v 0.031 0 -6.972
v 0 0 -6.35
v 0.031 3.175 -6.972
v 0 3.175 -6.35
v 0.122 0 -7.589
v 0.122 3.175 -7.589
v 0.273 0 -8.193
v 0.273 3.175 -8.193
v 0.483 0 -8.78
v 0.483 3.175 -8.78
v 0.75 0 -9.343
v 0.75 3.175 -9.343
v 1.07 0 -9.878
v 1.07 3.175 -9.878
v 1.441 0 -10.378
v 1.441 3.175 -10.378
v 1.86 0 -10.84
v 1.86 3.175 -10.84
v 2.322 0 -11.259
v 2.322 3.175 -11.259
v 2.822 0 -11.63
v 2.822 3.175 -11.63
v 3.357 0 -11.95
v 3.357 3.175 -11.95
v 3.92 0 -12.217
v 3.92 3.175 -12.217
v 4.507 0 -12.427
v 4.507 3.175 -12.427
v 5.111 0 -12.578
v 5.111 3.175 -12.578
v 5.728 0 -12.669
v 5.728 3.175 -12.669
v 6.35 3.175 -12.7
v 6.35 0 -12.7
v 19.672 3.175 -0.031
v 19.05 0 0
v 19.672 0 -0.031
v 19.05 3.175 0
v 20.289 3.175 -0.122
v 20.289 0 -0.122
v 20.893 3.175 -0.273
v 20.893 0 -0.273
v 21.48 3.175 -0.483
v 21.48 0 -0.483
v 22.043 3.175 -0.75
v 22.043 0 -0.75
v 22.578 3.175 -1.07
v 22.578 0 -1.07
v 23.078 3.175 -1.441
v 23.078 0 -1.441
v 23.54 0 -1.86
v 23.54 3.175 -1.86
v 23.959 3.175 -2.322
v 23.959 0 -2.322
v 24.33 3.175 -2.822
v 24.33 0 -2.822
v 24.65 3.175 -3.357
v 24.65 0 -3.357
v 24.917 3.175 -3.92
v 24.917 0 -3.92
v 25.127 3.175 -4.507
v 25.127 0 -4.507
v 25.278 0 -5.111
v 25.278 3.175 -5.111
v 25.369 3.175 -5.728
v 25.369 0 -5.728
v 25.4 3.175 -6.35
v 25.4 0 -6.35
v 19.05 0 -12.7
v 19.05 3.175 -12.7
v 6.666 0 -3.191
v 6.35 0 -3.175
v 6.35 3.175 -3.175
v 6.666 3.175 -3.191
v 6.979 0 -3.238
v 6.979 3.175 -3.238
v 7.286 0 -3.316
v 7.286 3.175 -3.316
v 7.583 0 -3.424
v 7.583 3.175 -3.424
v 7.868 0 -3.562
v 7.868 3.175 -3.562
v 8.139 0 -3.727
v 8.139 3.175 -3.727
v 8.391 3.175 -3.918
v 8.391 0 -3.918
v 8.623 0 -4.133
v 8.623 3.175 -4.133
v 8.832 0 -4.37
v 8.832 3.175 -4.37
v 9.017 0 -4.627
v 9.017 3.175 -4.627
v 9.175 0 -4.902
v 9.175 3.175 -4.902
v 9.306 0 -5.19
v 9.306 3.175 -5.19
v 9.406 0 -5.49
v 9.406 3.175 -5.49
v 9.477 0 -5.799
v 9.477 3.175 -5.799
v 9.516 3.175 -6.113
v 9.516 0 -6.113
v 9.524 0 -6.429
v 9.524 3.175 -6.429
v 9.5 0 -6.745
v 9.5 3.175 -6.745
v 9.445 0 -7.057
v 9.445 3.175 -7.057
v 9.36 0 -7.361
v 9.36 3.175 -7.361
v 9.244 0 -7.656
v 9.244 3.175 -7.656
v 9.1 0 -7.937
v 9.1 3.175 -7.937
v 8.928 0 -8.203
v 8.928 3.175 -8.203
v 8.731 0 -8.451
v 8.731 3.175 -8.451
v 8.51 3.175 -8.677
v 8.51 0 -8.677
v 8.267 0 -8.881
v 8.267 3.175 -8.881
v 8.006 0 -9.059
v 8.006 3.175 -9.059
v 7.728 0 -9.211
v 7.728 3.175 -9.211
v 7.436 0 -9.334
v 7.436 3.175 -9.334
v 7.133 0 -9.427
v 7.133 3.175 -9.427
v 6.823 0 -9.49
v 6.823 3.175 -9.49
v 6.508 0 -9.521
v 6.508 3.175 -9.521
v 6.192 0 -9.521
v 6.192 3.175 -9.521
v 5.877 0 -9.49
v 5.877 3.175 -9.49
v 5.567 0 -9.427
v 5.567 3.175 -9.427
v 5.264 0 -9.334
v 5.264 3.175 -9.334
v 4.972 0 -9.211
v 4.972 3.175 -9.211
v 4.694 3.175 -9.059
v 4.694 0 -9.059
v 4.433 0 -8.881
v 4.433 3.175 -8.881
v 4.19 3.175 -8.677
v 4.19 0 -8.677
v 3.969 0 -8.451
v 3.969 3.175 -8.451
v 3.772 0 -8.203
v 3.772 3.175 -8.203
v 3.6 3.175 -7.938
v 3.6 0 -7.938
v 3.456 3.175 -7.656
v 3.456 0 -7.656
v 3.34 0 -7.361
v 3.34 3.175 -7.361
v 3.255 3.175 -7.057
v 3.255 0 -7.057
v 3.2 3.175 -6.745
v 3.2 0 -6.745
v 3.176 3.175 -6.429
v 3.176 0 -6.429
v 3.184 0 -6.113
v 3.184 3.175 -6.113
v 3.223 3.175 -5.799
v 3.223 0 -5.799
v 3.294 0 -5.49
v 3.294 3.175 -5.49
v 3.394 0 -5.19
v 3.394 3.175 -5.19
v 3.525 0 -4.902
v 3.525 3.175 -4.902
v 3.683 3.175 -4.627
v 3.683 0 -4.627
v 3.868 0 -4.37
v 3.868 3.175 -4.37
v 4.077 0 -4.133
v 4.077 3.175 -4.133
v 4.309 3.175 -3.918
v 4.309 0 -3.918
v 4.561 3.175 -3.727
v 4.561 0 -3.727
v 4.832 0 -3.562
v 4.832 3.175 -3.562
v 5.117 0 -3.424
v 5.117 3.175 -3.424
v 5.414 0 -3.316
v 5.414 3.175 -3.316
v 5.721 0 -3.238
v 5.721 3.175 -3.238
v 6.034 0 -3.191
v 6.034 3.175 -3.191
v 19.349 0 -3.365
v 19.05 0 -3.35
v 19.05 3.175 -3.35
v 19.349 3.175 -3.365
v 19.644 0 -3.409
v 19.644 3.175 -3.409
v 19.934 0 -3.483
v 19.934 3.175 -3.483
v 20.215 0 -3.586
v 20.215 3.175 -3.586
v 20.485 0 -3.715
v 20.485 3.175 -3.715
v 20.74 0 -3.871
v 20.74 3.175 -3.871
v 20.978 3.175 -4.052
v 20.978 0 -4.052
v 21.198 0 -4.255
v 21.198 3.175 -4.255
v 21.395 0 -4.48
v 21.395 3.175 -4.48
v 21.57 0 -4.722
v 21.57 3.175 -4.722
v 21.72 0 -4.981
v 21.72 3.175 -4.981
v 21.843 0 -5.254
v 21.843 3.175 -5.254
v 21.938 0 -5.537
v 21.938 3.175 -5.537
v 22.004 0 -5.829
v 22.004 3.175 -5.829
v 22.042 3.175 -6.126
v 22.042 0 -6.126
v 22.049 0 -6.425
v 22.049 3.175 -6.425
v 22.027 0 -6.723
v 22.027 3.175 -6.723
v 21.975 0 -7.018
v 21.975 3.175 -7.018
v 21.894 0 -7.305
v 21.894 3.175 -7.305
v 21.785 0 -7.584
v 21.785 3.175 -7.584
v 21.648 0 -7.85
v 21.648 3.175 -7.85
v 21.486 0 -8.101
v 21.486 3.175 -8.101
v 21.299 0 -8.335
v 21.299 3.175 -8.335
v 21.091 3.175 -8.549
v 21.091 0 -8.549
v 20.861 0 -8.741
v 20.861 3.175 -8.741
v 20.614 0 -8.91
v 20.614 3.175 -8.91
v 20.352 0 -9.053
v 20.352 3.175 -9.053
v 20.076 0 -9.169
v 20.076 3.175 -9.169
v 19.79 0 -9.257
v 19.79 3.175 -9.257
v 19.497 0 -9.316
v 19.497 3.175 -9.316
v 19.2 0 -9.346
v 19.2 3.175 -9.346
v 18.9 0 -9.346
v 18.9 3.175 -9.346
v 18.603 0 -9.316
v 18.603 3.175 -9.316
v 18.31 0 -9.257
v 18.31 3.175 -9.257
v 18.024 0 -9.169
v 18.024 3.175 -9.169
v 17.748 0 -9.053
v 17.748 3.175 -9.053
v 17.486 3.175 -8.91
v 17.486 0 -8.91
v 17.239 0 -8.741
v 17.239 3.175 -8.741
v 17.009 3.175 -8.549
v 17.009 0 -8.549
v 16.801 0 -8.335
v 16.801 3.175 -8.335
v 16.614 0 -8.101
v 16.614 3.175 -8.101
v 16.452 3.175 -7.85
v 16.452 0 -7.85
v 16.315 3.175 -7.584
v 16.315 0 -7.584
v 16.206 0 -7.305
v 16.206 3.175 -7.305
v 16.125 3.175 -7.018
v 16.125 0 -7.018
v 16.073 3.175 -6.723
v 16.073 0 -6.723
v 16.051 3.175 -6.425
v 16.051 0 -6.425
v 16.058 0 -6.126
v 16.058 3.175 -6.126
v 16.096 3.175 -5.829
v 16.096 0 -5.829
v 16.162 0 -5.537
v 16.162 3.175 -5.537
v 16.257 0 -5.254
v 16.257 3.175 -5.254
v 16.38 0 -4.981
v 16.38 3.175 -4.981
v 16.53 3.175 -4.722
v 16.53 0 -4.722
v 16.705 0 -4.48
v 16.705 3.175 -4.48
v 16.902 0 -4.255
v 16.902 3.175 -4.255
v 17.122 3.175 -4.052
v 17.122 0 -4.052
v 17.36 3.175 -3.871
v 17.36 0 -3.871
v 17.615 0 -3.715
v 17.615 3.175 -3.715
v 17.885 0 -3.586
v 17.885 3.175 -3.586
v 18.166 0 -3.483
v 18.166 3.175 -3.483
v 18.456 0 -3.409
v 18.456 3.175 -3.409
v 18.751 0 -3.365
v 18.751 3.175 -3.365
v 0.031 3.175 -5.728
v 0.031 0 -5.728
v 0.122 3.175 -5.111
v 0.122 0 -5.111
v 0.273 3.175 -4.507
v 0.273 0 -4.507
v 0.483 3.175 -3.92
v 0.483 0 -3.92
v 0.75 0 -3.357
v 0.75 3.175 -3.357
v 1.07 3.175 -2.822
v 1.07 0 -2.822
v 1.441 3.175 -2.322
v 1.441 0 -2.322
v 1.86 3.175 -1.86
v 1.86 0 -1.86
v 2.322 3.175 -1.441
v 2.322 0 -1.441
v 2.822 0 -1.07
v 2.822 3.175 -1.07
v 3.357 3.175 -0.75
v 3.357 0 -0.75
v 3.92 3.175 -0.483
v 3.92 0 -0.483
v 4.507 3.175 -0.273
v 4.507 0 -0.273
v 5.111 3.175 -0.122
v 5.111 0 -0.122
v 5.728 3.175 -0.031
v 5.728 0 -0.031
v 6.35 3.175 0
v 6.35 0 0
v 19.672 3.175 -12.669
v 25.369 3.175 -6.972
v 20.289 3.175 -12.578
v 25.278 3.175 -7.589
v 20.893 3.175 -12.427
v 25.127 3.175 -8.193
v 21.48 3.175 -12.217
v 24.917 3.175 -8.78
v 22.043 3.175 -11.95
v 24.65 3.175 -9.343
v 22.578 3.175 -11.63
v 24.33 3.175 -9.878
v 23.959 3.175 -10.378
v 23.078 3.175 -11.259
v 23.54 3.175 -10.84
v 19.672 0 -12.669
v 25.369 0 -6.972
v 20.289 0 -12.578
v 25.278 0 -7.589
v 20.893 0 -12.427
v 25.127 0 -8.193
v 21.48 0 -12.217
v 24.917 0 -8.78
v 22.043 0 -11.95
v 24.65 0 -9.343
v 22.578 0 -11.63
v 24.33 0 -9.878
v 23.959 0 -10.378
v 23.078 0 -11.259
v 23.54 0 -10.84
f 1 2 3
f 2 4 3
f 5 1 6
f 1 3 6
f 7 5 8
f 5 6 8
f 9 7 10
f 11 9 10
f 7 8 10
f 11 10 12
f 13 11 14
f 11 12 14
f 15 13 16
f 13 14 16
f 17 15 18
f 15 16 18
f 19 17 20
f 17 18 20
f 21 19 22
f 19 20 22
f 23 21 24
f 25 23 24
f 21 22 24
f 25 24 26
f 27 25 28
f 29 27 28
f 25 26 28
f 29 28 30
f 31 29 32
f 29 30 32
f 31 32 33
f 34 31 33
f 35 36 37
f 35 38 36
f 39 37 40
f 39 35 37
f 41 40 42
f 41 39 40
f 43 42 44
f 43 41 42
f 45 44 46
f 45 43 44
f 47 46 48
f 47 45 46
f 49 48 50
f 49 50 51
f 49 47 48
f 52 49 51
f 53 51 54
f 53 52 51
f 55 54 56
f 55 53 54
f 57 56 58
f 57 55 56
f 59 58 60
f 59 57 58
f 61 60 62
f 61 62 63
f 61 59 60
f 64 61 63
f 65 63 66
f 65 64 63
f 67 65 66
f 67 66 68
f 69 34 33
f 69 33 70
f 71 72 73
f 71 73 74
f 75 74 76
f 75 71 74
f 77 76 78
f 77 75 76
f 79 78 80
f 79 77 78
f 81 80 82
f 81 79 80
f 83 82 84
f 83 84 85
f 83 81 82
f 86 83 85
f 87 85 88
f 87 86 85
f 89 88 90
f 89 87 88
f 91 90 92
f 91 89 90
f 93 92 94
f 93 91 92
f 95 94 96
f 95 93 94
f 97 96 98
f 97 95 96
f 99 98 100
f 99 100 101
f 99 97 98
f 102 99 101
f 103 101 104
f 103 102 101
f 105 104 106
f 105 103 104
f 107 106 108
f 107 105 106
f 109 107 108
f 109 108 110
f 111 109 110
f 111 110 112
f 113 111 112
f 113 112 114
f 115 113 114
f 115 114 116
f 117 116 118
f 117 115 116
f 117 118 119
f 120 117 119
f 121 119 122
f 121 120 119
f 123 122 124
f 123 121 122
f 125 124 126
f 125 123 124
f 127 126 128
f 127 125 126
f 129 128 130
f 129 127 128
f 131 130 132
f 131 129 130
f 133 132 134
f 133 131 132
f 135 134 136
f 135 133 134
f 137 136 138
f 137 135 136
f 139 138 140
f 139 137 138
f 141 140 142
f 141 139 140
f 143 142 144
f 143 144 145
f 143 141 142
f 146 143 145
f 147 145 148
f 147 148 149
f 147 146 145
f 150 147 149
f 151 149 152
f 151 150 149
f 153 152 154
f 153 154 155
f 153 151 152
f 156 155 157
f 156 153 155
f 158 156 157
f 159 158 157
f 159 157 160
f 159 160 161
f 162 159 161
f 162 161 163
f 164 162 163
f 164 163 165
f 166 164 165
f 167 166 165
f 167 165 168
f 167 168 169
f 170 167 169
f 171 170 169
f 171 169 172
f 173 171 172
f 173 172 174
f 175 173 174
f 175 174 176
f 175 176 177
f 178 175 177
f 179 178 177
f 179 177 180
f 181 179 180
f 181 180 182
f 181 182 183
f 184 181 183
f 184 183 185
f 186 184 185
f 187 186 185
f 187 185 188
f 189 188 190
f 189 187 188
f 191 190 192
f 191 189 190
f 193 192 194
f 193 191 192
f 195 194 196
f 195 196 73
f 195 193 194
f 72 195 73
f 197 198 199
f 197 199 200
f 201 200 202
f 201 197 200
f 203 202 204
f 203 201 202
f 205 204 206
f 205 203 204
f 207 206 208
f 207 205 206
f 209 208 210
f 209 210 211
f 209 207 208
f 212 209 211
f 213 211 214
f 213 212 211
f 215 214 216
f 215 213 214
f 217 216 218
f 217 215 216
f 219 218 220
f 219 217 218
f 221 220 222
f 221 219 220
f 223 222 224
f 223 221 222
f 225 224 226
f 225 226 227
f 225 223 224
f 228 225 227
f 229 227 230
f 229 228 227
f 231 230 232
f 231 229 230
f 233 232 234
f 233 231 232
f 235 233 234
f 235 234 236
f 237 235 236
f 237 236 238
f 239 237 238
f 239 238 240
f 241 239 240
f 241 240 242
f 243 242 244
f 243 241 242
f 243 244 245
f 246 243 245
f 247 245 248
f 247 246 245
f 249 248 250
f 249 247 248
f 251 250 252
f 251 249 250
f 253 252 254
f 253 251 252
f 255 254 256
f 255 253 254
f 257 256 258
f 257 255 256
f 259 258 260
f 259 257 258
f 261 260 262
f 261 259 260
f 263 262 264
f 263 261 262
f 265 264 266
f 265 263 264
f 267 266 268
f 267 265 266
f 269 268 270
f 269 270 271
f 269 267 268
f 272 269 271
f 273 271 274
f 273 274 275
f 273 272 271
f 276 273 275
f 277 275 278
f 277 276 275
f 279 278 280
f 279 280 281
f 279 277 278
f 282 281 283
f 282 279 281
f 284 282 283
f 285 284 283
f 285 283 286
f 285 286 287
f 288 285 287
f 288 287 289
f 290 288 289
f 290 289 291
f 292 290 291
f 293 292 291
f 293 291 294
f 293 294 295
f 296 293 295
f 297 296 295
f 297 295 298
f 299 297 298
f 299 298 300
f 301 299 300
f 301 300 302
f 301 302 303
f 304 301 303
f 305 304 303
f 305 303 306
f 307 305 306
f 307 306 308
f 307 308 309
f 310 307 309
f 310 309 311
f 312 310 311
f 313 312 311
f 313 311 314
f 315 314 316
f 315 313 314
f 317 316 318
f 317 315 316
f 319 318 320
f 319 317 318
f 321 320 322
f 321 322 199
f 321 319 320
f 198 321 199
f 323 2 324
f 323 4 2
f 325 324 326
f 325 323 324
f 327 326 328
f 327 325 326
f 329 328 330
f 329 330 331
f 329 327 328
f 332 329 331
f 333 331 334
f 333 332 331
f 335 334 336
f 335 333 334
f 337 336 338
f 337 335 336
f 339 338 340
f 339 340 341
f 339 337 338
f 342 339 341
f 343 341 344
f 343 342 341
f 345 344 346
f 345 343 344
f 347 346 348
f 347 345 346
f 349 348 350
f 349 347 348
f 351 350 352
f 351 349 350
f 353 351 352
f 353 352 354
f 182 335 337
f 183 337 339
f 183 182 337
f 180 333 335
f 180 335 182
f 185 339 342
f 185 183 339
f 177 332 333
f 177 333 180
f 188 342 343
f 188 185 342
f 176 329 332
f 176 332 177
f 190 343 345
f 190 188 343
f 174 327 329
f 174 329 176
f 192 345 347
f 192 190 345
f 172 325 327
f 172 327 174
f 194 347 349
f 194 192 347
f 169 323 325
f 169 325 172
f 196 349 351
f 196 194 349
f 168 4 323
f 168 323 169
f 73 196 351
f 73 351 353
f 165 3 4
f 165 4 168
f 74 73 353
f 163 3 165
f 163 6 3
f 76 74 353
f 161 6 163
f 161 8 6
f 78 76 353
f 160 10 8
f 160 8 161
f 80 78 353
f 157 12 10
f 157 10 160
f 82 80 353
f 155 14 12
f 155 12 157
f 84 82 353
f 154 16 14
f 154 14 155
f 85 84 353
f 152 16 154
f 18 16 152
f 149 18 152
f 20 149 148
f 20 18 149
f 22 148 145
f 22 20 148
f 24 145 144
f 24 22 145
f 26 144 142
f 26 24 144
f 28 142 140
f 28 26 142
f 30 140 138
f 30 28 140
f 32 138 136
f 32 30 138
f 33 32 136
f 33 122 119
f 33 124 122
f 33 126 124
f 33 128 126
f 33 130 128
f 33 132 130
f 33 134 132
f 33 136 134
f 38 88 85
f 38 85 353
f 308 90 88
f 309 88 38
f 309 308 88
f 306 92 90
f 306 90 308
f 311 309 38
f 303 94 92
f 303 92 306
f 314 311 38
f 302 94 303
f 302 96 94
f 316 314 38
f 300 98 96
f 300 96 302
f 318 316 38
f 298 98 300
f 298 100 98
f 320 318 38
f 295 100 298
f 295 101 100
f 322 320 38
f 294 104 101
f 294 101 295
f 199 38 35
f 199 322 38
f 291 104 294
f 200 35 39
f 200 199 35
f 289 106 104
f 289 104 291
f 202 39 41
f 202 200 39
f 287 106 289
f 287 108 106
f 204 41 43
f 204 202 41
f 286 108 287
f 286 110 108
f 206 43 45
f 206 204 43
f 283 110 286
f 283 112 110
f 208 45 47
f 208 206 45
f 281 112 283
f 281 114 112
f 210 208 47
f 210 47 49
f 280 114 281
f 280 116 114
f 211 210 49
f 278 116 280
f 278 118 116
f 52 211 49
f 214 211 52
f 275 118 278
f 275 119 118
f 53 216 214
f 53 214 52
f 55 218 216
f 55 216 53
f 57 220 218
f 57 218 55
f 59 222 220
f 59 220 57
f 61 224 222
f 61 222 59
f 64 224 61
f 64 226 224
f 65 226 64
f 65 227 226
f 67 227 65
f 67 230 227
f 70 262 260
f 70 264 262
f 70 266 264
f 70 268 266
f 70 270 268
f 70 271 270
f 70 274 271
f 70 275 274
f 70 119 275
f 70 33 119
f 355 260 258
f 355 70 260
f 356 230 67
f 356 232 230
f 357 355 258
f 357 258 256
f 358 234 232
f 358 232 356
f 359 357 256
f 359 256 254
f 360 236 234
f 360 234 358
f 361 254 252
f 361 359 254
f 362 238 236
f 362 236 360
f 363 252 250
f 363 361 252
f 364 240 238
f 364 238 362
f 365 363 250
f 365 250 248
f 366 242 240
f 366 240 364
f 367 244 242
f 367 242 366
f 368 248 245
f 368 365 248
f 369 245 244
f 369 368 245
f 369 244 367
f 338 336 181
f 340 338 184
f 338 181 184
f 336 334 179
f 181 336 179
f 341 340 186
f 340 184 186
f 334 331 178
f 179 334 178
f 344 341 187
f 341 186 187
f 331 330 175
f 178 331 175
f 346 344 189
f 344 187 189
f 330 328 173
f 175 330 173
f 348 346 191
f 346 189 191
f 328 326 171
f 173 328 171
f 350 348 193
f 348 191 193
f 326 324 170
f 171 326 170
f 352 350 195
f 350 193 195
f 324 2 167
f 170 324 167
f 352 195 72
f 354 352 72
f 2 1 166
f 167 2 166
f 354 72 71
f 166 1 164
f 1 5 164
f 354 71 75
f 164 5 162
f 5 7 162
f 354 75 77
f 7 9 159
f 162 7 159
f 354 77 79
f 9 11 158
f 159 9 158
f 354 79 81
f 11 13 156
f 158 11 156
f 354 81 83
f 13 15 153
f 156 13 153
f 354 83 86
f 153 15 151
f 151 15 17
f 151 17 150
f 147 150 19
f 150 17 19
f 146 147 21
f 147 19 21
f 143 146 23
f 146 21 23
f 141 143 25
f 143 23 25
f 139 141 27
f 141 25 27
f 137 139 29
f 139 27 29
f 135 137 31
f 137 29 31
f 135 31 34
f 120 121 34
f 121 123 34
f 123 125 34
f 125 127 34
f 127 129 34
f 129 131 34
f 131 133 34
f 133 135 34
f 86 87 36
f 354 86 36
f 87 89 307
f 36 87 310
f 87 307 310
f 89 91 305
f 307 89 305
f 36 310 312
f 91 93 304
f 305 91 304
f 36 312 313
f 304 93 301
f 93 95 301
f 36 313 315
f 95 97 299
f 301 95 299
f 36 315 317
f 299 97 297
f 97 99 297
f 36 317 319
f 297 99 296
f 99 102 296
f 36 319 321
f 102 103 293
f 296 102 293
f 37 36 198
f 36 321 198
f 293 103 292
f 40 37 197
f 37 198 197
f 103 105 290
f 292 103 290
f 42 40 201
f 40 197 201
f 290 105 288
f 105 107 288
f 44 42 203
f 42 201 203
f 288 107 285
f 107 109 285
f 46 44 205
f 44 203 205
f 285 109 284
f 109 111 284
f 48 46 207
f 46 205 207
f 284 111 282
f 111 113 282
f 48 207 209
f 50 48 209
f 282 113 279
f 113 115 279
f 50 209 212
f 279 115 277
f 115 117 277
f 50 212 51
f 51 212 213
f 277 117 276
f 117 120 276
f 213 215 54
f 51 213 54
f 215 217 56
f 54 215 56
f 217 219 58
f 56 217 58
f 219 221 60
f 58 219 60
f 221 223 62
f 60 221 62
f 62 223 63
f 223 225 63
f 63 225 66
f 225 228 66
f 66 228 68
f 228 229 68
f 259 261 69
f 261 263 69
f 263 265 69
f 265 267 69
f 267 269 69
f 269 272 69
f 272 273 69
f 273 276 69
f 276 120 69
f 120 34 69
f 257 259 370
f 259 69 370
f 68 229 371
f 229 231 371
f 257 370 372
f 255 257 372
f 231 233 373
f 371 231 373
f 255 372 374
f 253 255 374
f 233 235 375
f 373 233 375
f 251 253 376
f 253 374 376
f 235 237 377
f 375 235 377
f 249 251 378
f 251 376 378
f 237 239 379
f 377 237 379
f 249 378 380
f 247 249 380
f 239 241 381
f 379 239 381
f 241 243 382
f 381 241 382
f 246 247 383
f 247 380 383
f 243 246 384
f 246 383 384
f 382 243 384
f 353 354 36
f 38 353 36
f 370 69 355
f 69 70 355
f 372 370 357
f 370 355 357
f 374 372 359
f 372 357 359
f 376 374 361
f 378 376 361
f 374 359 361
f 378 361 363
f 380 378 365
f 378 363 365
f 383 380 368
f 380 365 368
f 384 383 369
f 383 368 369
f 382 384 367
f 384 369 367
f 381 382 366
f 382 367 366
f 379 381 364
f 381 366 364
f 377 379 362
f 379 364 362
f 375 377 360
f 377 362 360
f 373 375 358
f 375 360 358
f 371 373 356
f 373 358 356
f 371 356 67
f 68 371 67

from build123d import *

# Parameters (mm, degrees)
SKETCH1_W           = 25.4
SKETCH1_H           = 12.7
SKETCH1_R           = 3
SKETCH1_R_2         = 3.175
BOSS_EXTRUDE1_DEPTH = 3.175
FILLET1_R           = 6.35


with BuildPart() as part:
    # Sketch1 → Boss-Extrude1 (new body)
    with BuildSketch(Plane(origin=(0, 0, 0), x_dir=(1, 0, 0), z_dir=(0, 1, 0))):
        with Locations((12.7, 6.35)):
            Rectangle(SKETCH1_W, SKETCH1_H)
        with Locations(Location((19.05, 6.35, 0), (0, 0, 270))):
            Circle(SKETCH1_R, mode=Mode.SUBTRACT)
        with Locations(Location((6.35, 6.35, 0), (0, 0, 270))):
            Circle(SKETCH1_R_2, mode=Mode.SUBTRACT)
    extrude(amount=BOSS_EXTRUDE1_DEPTH)

    # Fillet1
    fillet1_edges = [part.edges().sort_by_distance(p)[0] for p in [
        (25.4, 1.5875, 0),
        (25.4, 1.5875, -12.7),
        (0, 1.5875, -12.7),
        (0, 1.5875, 0),
    ]]
    fillet(fillet1_edges, radius=FILLET1_R - 0.0001)  # a hair under: the kernel refuses the full size


solid = part.part
